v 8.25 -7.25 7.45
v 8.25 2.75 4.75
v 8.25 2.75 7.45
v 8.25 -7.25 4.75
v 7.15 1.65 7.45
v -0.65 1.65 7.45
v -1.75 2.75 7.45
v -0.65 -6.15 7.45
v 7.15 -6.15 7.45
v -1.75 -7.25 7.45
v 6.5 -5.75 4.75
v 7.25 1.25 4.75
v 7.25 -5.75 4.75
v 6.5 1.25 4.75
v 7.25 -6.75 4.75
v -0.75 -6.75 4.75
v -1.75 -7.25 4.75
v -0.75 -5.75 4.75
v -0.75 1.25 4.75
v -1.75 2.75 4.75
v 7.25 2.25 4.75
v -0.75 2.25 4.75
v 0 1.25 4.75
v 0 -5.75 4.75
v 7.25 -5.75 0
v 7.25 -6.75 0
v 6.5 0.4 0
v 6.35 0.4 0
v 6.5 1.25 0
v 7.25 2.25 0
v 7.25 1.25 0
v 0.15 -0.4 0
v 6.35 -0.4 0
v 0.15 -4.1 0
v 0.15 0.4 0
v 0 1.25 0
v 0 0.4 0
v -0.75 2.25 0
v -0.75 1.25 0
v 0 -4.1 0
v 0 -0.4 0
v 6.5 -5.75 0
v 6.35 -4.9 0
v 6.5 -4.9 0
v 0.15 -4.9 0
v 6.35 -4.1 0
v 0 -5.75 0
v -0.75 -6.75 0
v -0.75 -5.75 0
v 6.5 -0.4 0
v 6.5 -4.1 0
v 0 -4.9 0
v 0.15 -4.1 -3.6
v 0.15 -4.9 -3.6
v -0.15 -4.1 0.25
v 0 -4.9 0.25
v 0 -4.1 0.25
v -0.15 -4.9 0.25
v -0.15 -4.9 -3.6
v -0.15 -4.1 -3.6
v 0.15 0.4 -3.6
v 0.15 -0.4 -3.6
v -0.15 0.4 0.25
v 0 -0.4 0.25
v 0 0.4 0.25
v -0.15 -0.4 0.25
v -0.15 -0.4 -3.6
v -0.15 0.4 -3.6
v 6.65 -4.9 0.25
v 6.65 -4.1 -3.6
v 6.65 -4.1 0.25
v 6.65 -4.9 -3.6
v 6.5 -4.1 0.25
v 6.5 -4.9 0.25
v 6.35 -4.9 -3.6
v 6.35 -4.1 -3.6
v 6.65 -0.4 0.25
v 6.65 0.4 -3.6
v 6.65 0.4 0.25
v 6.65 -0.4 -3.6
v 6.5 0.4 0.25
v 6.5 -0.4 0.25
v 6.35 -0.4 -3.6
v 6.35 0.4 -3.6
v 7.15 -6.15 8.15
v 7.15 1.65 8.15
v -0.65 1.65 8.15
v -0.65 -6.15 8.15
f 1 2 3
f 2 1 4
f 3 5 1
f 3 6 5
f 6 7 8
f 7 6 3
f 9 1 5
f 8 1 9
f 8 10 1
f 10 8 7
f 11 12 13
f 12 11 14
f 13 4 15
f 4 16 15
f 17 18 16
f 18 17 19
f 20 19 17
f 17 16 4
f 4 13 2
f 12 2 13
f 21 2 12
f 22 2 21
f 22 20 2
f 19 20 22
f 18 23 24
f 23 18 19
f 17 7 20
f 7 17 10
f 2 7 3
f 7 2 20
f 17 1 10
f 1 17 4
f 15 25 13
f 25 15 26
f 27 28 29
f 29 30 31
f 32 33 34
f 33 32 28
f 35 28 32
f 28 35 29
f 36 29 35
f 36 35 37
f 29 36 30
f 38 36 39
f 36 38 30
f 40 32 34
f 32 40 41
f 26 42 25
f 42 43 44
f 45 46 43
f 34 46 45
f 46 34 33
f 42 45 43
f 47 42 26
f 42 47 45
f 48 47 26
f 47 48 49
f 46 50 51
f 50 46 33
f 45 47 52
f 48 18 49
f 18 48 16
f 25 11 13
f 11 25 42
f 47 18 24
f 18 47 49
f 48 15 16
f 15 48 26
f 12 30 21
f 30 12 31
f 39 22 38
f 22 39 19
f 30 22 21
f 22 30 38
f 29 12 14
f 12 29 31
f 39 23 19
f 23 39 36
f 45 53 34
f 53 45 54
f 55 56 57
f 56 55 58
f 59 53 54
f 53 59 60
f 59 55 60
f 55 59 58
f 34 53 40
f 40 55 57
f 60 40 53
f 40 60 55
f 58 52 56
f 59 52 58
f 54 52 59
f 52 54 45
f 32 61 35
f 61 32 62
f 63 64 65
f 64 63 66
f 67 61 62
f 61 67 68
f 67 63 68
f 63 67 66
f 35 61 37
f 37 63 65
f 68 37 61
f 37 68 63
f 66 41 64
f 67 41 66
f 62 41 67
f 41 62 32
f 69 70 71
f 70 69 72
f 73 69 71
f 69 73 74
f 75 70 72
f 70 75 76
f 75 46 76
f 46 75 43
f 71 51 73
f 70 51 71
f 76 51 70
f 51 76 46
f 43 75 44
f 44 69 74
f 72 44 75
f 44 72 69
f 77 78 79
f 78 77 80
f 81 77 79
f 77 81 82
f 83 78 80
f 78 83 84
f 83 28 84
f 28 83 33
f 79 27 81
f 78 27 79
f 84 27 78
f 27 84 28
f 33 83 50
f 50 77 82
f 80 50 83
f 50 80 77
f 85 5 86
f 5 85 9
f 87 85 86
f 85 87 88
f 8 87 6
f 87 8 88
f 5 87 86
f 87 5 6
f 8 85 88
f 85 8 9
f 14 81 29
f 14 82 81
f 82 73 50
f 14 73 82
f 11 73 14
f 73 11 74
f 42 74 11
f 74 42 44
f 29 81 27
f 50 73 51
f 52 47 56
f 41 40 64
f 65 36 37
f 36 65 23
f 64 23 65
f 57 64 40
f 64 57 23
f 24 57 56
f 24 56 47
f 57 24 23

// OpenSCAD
// Switronic lndustrial Corp. TS-AGGNH-G (TS-AGGNH-xxxG-G)

//target_obj = "silver_only";

translate([6.5/2, -4.5/2, 0]) {
    
    if (is_undef(target_obj) || (target_obj == "white_only"))
    color("White")
    union() {
        translate([-10/2, -10/2, 4.75])
        cube([10, 10, 2.7]);
        translate([-8/2, -8/2-1/2, 0])
        cube([8, 1, 4.75+0.25]);
        translate([-8/2, +8/2-1/2, 0])
        cube([8, 1, 4.75+0.25]);
    };


    if (is_undef(target_obj) || target_obj == "green_only")
    color("Green")
    translate([-7.8/2, -7.8/2, 4.75+0.7])
    cube([7.8, 7.8, 2.7]);

    if (is_undef(target_obj) || target_obj == "black_only")
    color("Black")
    translate([-6.5/2, -7/2, 0])
    cube([6.5, 7, 4.75+0.25]);

    if (is_undef(target_obj) || target_obj == "silver_only")
    color("Silver")
    union() {
        translate([-0.3/2-6.5/2, -0.8/2-4.5/2, -3.6])
        cube([0.3, 0.8, 3.6+0.25]);
        translate([-0.3/2-6.5/2, -0.8/2+4.5/2, -3.6])
        cube([0.3, 0.8, 3.6+0.25]);
        translate([-0.3/2+6.5/2, -0.8/2-4.5/2, -3.6])
        cube([0.3, 0.8, 3.6+0.25]);
        translate([-0.3/2+6.5/2, -0.8/2+4.5/2, -3.6])
        cube([0.3, 0.8, 3.6+0.25]);
    };

}
